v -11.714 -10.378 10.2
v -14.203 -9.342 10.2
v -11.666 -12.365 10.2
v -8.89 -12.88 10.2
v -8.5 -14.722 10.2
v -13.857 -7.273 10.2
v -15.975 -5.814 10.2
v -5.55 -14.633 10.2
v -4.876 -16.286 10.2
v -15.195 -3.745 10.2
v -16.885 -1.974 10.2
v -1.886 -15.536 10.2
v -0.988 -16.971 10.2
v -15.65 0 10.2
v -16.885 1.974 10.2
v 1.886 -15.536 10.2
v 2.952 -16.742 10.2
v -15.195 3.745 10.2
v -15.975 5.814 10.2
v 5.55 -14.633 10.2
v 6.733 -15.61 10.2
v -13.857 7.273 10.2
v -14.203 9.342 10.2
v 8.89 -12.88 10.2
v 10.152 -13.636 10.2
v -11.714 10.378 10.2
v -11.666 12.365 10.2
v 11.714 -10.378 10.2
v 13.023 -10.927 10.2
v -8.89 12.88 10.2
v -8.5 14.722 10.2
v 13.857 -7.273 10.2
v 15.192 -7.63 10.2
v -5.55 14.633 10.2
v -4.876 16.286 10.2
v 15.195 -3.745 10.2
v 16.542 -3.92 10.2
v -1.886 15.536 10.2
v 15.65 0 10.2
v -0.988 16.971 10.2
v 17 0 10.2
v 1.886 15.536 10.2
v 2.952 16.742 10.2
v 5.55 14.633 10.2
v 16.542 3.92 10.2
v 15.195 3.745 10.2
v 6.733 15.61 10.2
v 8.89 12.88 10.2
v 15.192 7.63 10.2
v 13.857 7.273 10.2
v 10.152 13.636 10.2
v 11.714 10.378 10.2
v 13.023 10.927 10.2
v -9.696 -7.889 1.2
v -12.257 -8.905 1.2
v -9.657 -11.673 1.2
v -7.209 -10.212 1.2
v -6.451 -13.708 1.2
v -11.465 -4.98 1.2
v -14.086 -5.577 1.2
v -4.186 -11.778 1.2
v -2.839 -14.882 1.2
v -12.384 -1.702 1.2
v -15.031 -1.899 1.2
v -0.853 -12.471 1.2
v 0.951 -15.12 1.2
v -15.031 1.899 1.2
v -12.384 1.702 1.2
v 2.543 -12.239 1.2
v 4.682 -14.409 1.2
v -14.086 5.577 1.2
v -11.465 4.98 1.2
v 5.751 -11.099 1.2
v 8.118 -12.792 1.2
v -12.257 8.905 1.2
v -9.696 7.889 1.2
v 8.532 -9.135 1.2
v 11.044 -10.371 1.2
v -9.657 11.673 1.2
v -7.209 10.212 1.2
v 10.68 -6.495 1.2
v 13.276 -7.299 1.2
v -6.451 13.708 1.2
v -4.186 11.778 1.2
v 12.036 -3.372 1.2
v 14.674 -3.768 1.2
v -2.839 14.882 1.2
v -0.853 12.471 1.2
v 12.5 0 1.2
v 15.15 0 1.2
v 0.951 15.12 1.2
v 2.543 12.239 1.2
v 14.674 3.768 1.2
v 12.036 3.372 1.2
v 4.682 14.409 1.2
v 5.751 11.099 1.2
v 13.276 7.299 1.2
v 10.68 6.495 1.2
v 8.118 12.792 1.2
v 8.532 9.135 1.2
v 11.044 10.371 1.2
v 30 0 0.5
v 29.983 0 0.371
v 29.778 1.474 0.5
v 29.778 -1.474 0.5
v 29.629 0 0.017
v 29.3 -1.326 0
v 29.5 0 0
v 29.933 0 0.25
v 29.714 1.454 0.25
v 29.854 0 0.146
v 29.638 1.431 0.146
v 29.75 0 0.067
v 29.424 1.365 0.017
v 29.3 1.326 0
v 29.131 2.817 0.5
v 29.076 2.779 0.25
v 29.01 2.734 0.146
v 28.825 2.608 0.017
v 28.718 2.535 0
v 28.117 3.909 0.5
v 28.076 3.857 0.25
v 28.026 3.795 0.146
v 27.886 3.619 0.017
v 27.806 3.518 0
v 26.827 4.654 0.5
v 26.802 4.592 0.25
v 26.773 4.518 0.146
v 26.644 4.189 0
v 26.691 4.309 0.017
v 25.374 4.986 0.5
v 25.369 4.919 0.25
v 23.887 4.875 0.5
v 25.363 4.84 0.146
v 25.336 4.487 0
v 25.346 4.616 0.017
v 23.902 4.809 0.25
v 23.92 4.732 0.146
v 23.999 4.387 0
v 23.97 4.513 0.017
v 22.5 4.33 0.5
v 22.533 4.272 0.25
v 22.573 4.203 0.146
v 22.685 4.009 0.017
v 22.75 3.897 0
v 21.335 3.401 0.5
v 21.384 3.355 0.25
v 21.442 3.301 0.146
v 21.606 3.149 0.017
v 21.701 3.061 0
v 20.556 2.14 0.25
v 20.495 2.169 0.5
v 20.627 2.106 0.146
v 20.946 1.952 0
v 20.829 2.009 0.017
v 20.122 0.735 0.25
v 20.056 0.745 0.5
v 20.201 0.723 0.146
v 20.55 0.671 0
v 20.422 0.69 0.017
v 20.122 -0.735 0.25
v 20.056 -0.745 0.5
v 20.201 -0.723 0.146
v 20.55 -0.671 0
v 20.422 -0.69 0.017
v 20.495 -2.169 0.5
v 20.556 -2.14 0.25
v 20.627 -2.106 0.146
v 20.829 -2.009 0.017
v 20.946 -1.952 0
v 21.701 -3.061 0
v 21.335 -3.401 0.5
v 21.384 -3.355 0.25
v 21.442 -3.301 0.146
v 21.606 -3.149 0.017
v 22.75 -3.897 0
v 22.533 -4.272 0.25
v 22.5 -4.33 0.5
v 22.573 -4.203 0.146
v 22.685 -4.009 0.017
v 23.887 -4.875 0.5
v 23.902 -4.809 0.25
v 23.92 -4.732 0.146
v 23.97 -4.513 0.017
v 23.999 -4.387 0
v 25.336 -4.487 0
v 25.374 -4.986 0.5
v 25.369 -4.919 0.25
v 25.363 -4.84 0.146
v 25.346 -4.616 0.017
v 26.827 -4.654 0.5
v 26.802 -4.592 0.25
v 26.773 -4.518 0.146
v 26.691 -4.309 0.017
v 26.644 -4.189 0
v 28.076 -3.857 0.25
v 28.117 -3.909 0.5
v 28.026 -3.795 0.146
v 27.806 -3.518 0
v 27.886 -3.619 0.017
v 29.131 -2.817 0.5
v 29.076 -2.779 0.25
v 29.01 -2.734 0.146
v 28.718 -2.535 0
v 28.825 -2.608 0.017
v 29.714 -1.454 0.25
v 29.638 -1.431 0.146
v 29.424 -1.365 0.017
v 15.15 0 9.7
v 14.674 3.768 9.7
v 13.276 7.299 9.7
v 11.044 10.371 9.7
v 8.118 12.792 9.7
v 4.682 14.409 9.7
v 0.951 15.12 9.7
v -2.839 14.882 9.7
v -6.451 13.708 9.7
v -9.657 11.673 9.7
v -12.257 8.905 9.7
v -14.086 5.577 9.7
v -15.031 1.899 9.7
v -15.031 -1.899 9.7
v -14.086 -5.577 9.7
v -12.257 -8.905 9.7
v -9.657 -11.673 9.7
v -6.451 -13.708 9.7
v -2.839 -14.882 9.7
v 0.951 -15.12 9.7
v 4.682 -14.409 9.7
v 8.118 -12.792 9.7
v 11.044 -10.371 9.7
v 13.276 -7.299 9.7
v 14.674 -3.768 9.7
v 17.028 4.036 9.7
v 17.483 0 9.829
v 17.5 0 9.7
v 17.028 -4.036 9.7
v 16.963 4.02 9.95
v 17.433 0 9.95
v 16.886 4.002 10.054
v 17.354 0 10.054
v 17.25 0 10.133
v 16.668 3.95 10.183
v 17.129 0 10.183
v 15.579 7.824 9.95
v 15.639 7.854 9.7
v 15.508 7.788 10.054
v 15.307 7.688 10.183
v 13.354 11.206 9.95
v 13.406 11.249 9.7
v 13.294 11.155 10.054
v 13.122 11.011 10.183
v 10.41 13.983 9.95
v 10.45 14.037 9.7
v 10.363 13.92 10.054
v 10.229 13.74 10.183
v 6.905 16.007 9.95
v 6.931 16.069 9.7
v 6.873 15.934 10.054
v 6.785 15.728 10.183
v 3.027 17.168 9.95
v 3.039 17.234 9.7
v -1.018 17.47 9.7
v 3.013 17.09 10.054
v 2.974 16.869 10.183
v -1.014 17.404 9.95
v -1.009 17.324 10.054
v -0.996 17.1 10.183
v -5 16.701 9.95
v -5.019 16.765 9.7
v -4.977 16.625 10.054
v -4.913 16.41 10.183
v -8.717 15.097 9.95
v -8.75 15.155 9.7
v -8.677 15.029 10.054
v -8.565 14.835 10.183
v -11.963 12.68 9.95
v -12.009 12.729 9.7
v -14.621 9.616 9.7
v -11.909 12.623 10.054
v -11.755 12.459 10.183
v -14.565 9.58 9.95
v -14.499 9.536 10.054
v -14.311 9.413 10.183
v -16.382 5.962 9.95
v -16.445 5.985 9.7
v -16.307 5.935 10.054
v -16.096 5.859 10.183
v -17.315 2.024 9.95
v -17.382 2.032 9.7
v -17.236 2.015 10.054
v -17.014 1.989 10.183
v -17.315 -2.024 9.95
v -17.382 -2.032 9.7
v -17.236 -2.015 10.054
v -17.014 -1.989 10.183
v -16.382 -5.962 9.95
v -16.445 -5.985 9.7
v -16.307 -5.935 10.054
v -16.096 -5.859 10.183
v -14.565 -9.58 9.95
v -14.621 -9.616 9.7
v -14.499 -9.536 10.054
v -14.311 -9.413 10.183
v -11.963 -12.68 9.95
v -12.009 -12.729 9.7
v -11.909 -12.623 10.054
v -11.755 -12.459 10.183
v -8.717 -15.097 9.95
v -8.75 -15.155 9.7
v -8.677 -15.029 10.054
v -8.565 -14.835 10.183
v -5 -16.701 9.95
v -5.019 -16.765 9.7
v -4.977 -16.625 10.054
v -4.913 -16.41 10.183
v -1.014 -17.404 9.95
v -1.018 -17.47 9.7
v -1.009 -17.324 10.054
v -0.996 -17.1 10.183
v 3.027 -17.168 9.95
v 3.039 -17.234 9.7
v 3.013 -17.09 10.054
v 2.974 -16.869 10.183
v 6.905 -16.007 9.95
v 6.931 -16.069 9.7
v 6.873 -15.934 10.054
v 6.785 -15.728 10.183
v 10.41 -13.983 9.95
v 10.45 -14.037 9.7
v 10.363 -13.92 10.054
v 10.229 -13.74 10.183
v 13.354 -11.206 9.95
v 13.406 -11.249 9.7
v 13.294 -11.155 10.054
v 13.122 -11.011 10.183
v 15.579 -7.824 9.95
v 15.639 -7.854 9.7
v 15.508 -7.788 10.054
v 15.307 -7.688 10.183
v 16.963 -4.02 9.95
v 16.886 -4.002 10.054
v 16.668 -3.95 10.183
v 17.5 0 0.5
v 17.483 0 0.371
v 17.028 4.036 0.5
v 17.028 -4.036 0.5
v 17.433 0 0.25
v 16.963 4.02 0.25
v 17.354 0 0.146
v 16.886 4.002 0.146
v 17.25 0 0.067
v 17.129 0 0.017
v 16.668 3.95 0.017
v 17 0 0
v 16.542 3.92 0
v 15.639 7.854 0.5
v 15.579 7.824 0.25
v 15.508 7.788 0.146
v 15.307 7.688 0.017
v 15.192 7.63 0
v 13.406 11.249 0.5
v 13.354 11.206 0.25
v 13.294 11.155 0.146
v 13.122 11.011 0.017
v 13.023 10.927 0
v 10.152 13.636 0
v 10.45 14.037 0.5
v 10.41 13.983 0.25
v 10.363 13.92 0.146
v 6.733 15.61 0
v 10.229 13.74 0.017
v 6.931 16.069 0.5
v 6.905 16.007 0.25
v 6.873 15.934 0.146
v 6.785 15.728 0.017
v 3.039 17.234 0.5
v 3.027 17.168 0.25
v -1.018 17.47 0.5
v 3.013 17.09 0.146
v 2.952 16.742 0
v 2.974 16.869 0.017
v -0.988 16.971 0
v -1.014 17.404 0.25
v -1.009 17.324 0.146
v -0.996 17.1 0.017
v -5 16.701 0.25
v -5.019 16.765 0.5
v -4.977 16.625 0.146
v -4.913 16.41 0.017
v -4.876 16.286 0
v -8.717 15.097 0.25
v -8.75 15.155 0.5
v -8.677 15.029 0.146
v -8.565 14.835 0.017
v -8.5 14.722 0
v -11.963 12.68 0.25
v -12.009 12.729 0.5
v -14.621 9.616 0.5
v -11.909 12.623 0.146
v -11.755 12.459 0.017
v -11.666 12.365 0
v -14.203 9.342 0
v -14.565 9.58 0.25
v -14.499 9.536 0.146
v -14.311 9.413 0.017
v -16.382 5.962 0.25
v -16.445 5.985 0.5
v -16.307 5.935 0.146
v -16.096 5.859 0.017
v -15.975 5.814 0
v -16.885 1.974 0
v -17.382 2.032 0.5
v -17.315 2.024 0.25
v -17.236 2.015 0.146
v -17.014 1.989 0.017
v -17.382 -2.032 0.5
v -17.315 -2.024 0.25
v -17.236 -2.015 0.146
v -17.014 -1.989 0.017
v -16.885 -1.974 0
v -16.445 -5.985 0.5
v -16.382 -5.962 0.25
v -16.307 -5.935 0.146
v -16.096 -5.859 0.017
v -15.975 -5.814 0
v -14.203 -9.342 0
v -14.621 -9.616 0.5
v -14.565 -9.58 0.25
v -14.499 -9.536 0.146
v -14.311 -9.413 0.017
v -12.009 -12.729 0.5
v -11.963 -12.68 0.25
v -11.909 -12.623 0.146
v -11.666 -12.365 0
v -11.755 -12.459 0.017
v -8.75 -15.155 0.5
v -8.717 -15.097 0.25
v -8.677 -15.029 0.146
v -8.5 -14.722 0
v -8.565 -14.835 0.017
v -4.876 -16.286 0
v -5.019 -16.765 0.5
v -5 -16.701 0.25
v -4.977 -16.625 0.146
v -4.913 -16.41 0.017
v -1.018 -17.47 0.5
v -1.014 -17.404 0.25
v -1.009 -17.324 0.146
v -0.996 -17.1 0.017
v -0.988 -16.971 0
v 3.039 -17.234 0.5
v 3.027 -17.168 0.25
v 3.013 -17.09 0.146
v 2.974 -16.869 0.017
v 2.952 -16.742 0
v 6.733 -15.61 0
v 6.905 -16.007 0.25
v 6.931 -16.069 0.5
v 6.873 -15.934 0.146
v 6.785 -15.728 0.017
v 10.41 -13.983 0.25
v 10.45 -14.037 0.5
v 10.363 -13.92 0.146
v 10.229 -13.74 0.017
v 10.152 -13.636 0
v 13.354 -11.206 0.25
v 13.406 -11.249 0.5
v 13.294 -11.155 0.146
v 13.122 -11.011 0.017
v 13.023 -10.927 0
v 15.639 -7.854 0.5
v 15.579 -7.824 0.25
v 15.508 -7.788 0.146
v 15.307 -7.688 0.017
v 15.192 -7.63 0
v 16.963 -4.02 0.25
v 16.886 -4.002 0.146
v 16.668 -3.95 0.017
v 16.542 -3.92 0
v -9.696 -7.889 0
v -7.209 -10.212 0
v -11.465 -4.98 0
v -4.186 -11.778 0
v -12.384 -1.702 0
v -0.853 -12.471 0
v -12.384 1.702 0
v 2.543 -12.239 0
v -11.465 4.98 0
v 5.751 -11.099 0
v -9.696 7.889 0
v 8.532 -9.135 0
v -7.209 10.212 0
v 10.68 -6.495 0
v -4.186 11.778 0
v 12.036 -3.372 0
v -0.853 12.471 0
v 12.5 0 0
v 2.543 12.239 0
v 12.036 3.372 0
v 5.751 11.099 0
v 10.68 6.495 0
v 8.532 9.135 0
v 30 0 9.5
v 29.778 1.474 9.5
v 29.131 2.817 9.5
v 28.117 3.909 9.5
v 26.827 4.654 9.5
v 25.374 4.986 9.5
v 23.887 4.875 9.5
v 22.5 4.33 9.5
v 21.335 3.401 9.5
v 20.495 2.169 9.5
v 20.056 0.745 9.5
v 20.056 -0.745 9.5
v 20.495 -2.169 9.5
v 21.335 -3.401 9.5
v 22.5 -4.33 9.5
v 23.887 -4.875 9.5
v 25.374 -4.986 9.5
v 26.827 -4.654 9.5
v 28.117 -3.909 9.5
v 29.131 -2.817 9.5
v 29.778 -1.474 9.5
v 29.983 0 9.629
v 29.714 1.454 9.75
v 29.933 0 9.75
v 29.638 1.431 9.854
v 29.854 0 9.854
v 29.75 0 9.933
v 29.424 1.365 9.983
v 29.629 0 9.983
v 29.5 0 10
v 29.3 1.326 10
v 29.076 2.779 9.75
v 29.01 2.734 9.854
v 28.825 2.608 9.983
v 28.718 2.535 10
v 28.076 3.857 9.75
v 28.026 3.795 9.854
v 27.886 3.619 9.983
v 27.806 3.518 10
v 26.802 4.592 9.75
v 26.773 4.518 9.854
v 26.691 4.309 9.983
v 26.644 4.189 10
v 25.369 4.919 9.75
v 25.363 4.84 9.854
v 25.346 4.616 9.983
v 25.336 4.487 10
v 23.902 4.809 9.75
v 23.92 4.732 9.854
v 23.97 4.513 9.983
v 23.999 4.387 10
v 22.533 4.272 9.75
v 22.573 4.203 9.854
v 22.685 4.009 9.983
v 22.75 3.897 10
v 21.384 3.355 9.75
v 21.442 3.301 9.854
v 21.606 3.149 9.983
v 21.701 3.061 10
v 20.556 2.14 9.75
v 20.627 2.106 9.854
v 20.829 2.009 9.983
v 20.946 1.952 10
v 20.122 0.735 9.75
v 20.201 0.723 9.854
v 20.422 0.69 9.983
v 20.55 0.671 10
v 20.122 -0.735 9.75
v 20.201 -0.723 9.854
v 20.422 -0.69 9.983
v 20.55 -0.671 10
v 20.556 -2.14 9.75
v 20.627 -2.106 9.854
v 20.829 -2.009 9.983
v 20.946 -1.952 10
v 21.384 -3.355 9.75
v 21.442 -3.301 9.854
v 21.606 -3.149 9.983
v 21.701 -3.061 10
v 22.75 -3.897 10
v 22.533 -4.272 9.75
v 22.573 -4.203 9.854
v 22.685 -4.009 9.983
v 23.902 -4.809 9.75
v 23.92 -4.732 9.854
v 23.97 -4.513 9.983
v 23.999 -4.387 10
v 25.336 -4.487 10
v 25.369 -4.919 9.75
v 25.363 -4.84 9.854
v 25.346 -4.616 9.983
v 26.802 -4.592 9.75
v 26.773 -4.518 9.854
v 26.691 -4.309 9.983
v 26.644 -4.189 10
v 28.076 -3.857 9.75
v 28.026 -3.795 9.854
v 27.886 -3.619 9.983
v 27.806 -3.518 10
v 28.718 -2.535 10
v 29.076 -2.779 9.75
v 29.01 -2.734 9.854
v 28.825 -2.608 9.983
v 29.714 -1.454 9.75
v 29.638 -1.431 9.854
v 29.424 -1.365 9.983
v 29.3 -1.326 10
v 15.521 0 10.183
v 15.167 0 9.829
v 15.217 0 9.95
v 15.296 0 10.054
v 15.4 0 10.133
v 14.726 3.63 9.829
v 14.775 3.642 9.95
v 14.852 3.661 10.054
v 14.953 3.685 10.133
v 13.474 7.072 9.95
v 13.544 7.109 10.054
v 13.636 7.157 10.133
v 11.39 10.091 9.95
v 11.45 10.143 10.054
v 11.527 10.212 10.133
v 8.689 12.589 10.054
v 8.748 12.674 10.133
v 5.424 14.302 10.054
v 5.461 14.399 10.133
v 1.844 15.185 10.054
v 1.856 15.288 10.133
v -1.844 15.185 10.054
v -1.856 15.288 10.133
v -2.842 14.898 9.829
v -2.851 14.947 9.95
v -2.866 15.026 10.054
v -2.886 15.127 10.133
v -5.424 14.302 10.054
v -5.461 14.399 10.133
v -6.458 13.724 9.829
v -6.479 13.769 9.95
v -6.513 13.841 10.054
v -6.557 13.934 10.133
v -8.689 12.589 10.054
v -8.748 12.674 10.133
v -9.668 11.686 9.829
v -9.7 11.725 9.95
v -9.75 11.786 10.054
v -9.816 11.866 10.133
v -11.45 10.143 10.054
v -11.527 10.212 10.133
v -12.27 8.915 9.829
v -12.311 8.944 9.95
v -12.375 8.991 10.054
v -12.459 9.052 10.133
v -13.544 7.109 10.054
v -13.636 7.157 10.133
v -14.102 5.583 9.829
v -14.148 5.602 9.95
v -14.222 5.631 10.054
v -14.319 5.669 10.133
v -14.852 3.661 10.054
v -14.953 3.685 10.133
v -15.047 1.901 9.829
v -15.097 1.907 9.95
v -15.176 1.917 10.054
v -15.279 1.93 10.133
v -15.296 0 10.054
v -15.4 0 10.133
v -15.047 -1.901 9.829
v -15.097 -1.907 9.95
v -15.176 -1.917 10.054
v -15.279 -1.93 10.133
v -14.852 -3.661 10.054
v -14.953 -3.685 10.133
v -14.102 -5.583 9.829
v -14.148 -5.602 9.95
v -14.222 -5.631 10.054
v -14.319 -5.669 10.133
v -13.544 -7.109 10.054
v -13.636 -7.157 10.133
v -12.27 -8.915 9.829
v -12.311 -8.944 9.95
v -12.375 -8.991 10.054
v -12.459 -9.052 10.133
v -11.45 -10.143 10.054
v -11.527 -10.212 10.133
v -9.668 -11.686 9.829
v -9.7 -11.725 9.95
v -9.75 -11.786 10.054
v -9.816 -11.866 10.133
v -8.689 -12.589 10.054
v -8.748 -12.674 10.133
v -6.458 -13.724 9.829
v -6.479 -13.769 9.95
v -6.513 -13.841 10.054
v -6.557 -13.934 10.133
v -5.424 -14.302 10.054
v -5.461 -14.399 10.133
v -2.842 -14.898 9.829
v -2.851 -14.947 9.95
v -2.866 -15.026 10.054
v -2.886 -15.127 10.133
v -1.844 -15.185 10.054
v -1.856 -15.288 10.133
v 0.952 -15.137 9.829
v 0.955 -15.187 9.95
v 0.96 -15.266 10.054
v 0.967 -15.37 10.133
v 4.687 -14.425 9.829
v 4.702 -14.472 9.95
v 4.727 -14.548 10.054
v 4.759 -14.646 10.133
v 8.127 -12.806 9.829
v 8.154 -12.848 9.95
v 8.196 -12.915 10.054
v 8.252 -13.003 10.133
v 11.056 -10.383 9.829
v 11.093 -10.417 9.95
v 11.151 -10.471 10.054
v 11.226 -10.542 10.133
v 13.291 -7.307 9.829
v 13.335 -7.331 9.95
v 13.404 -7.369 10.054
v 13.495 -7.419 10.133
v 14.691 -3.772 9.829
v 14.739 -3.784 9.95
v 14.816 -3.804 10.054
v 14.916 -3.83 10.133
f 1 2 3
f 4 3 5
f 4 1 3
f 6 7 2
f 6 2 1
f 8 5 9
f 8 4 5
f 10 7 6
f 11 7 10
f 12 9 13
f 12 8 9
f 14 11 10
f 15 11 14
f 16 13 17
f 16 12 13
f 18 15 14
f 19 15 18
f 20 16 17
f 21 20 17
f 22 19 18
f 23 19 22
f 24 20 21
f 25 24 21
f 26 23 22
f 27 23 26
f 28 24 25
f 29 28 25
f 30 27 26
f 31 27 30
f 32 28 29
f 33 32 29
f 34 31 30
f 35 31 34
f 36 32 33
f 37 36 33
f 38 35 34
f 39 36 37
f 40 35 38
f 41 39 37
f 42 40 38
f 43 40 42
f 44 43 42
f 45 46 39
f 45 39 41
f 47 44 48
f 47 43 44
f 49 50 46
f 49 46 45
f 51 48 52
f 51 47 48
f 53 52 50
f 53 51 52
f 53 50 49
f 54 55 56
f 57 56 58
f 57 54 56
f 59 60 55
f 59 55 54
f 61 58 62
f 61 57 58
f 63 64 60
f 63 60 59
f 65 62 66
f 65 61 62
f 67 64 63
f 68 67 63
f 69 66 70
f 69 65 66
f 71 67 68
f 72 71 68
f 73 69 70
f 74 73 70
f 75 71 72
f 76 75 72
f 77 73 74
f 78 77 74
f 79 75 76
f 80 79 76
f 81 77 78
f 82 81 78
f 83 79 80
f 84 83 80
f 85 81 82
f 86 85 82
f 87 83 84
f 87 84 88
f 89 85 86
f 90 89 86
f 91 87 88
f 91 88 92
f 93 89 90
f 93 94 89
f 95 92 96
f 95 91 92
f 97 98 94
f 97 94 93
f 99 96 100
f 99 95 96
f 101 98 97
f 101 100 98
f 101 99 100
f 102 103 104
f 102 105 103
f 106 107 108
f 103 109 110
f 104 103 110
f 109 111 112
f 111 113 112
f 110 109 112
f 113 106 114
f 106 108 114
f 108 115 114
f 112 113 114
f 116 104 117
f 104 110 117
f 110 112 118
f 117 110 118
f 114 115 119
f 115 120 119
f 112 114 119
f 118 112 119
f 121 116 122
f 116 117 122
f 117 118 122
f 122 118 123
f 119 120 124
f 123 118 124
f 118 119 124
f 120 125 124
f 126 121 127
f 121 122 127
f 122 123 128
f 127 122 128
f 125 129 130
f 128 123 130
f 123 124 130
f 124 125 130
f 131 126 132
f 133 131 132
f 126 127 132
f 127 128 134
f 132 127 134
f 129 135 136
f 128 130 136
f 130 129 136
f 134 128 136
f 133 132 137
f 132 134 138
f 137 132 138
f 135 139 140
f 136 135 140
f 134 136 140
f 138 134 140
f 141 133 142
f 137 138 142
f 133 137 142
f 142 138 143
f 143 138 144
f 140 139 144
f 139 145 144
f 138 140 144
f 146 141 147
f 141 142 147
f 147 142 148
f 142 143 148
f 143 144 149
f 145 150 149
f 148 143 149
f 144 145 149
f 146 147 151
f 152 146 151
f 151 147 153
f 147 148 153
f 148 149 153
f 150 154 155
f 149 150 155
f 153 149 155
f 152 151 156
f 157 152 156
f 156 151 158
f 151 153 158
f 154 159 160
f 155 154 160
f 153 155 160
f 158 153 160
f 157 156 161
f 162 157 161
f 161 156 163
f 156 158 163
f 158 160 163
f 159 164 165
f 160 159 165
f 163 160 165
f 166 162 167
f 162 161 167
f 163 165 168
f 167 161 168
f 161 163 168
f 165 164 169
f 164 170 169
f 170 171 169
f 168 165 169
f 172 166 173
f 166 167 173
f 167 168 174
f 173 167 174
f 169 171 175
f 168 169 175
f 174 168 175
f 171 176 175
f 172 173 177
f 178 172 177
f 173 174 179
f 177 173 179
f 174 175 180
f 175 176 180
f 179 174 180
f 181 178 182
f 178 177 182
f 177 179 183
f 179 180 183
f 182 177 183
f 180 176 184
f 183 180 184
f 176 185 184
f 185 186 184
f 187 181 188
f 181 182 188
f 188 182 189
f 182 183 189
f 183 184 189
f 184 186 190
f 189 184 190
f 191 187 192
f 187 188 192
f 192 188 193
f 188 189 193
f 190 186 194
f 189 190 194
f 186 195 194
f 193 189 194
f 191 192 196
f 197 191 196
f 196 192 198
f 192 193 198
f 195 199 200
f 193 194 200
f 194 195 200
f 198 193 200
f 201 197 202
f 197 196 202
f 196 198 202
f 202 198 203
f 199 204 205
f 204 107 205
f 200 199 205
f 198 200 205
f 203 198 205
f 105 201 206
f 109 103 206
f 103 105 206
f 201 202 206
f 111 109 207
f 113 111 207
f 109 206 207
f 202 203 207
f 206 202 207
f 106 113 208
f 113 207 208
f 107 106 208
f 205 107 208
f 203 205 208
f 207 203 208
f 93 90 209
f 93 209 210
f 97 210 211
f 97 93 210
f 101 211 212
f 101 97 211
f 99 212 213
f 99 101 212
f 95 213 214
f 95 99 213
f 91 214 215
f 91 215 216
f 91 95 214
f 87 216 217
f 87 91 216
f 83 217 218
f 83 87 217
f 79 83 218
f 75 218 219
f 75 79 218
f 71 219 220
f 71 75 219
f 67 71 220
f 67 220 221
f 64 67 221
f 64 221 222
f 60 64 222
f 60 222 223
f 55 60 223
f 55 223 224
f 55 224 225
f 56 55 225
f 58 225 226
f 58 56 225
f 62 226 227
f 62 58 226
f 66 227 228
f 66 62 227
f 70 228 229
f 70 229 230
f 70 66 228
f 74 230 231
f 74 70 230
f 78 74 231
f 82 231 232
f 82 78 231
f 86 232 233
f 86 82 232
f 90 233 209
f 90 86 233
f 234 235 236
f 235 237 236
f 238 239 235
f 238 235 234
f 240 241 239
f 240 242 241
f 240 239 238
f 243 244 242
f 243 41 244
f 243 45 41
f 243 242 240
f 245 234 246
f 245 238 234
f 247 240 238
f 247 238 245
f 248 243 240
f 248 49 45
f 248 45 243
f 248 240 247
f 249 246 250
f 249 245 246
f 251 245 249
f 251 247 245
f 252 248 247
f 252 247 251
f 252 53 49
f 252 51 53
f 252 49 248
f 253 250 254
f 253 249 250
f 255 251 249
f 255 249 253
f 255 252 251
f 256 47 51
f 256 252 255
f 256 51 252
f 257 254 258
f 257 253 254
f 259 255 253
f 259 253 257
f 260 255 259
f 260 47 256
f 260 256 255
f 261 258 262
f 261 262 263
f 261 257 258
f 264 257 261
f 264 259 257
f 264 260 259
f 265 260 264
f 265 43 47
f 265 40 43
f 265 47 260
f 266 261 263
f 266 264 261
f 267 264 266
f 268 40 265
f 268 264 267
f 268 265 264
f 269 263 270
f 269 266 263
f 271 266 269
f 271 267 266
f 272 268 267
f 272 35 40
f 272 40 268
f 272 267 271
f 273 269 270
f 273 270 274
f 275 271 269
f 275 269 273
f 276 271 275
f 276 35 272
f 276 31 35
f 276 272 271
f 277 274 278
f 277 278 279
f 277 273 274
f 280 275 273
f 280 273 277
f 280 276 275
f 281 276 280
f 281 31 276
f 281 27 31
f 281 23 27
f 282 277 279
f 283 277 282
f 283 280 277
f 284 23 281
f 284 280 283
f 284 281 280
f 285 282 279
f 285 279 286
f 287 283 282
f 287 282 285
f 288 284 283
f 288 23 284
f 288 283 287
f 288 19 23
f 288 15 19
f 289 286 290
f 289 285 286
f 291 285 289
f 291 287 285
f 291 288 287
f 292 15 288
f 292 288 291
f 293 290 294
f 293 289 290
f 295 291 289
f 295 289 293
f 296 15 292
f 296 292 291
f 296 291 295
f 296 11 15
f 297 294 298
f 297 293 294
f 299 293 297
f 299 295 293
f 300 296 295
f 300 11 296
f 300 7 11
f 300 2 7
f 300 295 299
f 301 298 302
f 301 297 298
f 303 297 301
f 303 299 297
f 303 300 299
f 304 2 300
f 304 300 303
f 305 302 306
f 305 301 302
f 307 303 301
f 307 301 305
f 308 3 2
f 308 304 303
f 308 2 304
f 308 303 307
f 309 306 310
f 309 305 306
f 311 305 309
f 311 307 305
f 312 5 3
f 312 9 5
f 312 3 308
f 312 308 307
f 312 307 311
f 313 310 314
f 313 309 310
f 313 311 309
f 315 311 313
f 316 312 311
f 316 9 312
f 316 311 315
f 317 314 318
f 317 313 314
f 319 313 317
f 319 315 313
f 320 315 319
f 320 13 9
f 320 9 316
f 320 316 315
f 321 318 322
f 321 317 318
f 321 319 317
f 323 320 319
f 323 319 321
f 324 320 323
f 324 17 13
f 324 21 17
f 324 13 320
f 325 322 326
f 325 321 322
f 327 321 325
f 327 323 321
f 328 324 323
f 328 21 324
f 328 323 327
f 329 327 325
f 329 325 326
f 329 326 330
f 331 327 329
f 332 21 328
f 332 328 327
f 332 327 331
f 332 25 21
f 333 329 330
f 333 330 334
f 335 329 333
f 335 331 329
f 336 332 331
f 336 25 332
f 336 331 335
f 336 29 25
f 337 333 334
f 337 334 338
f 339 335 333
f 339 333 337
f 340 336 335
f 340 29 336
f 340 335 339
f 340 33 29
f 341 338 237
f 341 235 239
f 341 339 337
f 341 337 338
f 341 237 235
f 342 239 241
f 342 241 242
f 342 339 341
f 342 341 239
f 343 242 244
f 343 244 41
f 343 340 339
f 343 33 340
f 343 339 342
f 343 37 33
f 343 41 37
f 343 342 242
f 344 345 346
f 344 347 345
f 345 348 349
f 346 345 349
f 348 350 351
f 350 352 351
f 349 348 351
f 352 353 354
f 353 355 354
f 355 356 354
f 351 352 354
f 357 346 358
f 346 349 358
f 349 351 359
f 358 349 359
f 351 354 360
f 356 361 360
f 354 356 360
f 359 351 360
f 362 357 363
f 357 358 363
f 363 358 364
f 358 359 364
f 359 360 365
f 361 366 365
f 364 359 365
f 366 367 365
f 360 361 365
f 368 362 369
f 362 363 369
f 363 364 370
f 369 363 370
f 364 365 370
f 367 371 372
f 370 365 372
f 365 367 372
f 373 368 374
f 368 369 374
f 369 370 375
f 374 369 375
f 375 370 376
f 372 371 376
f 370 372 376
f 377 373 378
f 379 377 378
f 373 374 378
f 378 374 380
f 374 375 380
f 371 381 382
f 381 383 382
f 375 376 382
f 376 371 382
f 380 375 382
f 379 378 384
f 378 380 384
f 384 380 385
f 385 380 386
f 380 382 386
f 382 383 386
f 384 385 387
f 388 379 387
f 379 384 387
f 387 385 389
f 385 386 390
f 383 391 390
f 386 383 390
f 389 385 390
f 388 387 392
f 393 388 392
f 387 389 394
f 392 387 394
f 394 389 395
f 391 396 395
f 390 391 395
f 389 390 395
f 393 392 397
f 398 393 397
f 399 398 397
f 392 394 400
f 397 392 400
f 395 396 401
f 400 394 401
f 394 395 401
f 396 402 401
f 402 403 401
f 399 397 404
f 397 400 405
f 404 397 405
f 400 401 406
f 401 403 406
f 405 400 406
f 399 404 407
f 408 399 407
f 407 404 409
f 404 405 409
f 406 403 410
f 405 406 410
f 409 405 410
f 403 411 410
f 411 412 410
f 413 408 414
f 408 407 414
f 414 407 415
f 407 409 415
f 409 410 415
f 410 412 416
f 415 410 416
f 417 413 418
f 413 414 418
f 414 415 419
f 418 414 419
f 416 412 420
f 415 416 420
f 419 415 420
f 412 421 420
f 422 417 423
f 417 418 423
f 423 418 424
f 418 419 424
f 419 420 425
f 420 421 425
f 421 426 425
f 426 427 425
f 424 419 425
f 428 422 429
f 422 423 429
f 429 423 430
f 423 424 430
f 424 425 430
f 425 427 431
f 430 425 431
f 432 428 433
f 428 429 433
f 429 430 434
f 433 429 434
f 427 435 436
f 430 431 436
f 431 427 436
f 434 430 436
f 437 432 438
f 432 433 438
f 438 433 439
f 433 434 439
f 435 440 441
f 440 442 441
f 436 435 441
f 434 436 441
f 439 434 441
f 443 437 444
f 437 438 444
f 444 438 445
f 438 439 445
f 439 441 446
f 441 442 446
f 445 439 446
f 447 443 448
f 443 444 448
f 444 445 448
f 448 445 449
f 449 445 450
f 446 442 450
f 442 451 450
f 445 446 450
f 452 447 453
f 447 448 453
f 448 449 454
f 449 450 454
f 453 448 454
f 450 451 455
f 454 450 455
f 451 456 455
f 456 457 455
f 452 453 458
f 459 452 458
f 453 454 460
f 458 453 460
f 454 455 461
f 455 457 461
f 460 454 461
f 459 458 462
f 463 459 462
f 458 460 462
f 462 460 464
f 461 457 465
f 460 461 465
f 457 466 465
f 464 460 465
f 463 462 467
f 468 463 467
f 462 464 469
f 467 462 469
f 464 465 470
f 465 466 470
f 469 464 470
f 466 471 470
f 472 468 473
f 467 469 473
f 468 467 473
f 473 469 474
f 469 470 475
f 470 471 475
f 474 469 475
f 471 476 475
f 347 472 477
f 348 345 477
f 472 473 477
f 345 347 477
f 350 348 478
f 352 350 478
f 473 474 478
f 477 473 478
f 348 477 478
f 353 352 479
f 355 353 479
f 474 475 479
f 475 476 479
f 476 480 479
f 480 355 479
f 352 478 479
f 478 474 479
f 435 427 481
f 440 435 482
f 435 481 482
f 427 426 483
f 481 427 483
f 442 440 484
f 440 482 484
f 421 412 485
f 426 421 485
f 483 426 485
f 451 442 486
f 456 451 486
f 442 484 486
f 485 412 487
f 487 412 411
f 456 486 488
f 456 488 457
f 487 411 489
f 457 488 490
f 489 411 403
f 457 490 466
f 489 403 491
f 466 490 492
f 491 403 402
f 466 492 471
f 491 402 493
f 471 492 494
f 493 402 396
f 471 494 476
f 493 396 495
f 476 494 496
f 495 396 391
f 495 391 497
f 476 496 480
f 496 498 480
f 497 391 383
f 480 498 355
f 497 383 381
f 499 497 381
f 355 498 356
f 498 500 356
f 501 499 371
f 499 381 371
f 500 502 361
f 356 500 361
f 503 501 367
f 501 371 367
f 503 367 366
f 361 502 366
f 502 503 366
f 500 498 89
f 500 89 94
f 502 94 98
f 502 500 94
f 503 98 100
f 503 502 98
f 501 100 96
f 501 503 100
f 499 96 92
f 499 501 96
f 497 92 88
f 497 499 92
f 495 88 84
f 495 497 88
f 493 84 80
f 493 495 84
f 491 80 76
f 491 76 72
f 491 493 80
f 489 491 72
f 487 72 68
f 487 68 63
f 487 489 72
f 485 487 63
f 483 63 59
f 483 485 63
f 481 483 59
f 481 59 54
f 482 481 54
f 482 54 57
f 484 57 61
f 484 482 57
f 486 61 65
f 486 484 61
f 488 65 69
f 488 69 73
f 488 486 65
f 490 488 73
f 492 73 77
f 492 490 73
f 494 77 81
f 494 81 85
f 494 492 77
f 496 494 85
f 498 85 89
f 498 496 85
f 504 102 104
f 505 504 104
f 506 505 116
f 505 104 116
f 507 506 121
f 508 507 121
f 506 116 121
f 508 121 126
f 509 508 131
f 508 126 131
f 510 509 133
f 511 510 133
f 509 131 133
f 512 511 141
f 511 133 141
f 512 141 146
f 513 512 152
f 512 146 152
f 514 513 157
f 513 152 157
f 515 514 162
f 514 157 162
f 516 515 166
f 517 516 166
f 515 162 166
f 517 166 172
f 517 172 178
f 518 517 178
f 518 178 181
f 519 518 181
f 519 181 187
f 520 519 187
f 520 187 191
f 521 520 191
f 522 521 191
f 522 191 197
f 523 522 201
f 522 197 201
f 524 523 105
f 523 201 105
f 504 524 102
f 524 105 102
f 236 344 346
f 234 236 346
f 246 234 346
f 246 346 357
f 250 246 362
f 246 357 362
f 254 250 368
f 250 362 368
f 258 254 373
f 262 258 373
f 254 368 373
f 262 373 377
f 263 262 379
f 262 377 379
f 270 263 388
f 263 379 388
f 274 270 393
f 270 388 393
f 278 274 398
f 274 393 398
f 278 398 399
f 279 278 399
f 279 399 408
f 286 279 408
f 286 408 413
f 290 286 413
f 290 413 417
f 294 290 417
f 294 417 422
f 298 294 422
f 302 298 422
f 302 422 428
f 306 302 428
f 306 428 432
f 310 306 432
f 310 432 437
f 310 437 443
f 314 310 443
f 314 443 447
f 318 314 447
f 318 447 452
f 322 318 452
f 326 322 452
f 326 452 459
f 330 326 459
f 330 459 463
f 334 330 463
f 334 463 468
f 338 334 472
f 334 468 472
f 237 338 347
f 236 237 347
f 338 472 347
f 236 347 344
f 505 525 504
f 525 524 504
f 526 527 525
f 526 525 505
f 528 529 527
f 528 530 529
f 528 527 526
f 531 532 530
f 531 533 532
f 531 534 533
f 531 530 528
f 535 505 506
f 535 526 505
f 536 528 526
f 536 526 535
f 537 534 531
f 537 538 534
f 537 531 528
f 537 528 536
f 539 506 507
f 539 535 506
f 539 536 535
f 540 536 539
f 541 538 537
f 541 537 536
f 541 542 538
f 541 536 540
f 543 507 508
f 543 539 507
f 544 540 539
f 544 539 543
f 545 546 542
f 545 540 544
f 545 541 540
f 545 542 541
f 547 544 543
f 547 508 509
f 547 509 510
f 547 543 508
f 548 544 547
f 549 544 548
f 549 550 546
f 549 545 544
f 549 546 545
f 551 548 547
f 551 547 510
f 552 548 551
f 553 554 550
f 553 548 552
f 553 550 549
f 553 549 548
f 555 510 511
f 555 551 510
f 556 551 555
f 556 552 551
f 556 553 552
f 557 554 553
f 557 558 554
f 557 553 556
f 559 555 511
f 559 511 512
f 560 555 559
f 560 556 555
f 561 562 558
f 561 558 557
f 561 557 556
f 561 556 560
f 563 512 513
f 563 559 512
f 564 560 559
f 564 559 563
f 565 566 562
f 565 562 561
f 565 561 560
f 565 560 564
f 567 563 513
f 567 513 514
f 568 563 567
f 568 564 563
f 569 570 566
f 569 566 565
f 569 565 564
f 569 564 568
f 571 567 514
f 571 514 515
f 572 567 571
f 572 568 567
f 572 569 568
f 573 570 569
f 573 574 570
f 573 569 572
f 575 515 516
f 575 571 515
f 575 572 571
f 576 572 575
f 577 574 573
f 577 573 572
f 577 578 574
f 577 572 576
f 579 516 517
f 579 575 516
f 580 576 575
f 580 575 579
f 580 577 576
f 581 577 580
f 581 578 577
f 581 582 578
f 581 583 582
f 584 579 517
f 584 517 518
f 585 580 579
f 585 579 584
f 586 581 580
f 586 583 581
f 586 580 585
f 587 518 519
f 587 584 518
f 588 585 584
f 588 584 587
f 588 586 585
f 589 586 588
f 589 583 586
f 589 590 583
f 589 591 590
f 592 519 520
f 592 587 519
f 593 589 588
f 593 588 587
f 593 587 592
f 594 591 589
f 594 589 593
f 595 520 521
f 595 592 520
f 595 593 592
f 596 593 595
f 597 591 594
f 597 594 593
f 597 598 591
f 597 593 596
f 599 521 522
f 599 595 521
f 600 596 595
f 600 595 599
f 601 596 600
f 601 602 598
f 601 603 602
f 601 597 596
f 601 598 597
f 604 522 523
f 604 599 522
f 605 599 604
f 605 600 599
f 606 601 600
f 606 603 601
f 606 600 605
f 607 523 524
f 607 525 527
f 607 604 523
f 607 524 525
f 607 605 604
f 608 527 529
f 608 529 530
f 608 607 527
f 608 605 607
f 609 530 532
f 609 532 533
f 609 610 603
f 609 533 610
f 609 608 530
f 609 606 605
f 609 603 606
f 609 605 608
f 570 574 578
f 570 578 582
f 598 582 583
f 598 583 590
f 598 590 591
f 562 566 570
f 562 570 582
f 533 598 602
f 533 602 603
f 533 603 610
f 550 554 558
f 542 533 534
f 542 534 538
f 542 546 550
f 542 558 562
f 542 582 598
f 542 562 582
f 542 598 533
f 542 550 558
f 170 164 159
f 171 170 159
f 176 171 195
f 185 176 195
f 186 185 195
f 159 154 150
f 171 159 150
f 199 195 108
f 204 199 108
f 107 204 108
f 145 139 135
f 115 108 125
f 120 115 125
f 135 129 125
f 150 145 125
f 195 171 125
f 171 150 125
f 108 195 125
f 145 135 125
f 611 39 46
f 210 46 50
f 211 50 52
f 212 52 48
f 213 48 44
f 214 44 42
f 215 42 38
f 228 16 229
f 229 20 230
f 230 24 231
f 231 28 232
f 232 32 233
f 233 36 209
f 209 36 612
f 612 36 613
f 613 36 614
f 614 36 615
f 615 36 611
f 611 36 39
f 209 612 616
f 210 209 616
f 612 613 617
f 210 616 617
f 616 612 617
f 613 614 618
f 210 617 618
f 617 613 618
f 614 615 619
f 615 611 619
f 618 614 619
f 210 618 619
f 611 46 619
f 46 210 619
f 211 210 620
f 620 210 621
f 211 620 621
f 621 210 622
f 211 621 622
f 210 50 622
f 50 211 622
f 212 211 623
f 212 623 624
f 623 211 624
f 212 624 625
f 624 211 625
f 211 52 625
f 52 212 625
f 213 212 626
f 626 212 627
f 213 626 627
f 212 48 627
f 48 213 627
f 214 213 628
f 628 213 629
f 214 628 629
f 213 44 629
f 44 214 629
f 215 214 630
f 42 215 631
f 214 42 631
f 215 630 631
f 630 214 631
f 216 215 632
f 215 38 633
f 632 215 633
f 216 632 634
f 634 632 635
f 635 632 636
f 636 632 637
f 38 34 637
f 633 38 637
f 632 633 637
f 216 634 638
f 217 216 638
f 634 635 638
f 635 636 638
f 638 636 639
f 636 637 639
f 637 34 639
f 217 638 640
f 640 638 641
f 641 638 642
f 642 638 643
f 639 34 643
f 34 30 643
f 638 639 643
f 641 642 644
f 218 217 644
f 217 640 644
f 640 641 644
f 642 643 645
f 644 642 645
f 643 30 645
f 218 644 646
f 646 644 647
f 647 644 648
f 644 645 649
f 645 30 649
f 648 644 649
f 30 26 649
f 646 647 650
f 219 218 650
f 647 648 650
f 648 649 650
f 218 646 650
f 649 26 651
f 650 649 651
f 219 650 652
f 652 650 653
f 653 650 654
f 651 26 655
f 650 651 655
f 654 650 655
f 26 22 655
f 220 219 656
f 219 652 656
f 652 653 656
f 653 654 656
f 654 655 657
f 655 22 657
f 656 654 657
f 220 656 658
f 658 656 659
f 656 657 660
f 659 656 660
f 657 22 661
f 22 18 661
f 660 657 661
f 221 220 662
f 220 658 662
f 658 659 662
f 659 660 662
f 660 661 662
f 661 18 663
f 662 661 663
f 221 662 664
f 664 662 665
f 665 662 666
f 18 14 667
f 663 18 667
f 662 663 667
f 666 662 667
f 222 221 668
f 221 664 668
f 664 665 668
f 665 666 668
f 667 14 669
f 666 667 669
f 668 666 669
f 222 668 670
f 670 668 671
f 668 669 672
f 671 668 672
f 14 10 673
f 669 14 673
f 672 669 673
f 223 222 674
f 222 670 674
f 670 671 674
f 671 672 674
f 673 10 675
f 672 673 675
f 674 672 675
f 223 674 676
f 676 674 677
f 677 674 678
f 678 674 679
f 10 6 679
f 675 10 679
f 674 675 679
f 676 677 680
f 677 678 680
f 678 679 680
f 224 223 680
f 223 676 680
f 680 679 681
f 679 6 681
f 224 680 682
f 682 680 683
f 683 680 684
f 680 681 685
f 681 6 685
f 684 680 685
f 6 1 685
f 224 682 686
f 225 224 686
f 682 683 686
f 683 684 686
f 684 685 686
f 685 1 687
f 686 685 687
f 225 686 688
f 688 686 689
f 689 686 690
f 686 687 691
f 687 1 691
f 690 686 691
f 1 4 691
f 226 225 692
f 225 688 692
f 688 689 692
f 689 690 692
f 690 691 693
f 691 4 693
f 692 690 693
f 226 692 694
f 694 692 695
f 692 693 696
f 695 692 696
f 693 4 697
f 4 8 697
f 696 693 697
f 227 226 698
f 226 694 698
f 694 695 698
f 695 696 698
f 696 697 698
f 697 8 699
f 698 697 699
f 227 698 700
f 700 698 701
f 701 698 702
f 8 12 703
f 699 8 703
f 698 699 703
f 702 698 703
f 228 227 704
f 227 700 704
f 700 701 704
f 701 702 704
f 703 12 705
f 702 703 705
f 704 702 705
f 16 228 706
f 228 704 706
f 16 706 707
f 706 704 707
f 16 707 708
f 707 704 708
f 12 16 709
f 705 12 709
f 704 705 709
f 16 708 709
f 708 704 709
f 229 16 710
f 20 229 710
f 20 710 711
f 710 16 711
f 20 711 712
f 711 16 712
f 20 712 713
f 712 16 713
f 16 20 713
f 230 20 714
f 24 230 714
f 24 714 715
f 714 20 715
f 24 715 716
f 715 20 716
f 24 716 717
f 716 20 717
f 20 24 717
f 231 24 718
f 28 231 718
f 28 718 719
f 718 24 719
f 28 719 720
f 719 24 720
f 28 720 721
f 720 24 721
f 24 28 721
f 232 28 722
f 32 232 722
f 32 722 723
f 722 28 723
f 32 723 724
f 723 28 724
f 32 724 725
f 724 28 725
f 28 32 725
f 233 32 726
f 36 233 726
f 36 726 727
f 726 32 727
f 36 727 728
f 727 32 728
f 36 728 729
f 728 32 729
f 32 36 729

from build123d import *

# Parameters (mm, degrees)
F0_R     = 17.5
F0_R_2   = 12.5
F1_DEPTH = 1.2
F2_R     = 17.5
F2_R_2   = 15.15
F3_DEPTH = 9
F4_R     = 0.5
F5_R     = 5
F6_DEPTH = 10
F7_R     = 0.5


with BuildPart() as f1:
    # F0 (on Top) → F1 (new body)
    with BuildSketch(Plane.XY):
        Circle(F0_R)
        Circle(F0_R_2, mode=Mode.SUBTRACT)
    extrude(amount=F1_DEPTH)

    # F2 (on face) → F3 (join)
    with BuildSketch(Plane.XY.offset(1.2)):
        Circle(F2_R)
        Circle(F2_R_2, mode=Mode.SUBTRACT)
    extrude(amount=F3_DEPTH)

    # F4
    f4_edges = [f1.edges().sort_by_distance(p)[0] for p in [
        (-15.15, 0, 10.2),
        (-17.5, 0, 10.2),
        (-17.5, 0, 0),
    ]]
    fillet(f4_edges, radius=F4_R)


with BuildPart() as f6:
    # F5 (on Top) → F6 (new body)
    with BuildSketch(Plane.XY):
        with Locations((25, 0)):
            Circle(F5_R)
    extrude(amount=F6_DEPTH)

    # F7
    f7_edges = [f6.edges().sort_by_distance(p)[0] for p in [
        (30, 0, 5),
        (20, 0, 0),
        (20, 0, 10),
    ]]
    fillet(f7_edges, radius=F7_R)


solid = Compound([f1.part, f6.part])
